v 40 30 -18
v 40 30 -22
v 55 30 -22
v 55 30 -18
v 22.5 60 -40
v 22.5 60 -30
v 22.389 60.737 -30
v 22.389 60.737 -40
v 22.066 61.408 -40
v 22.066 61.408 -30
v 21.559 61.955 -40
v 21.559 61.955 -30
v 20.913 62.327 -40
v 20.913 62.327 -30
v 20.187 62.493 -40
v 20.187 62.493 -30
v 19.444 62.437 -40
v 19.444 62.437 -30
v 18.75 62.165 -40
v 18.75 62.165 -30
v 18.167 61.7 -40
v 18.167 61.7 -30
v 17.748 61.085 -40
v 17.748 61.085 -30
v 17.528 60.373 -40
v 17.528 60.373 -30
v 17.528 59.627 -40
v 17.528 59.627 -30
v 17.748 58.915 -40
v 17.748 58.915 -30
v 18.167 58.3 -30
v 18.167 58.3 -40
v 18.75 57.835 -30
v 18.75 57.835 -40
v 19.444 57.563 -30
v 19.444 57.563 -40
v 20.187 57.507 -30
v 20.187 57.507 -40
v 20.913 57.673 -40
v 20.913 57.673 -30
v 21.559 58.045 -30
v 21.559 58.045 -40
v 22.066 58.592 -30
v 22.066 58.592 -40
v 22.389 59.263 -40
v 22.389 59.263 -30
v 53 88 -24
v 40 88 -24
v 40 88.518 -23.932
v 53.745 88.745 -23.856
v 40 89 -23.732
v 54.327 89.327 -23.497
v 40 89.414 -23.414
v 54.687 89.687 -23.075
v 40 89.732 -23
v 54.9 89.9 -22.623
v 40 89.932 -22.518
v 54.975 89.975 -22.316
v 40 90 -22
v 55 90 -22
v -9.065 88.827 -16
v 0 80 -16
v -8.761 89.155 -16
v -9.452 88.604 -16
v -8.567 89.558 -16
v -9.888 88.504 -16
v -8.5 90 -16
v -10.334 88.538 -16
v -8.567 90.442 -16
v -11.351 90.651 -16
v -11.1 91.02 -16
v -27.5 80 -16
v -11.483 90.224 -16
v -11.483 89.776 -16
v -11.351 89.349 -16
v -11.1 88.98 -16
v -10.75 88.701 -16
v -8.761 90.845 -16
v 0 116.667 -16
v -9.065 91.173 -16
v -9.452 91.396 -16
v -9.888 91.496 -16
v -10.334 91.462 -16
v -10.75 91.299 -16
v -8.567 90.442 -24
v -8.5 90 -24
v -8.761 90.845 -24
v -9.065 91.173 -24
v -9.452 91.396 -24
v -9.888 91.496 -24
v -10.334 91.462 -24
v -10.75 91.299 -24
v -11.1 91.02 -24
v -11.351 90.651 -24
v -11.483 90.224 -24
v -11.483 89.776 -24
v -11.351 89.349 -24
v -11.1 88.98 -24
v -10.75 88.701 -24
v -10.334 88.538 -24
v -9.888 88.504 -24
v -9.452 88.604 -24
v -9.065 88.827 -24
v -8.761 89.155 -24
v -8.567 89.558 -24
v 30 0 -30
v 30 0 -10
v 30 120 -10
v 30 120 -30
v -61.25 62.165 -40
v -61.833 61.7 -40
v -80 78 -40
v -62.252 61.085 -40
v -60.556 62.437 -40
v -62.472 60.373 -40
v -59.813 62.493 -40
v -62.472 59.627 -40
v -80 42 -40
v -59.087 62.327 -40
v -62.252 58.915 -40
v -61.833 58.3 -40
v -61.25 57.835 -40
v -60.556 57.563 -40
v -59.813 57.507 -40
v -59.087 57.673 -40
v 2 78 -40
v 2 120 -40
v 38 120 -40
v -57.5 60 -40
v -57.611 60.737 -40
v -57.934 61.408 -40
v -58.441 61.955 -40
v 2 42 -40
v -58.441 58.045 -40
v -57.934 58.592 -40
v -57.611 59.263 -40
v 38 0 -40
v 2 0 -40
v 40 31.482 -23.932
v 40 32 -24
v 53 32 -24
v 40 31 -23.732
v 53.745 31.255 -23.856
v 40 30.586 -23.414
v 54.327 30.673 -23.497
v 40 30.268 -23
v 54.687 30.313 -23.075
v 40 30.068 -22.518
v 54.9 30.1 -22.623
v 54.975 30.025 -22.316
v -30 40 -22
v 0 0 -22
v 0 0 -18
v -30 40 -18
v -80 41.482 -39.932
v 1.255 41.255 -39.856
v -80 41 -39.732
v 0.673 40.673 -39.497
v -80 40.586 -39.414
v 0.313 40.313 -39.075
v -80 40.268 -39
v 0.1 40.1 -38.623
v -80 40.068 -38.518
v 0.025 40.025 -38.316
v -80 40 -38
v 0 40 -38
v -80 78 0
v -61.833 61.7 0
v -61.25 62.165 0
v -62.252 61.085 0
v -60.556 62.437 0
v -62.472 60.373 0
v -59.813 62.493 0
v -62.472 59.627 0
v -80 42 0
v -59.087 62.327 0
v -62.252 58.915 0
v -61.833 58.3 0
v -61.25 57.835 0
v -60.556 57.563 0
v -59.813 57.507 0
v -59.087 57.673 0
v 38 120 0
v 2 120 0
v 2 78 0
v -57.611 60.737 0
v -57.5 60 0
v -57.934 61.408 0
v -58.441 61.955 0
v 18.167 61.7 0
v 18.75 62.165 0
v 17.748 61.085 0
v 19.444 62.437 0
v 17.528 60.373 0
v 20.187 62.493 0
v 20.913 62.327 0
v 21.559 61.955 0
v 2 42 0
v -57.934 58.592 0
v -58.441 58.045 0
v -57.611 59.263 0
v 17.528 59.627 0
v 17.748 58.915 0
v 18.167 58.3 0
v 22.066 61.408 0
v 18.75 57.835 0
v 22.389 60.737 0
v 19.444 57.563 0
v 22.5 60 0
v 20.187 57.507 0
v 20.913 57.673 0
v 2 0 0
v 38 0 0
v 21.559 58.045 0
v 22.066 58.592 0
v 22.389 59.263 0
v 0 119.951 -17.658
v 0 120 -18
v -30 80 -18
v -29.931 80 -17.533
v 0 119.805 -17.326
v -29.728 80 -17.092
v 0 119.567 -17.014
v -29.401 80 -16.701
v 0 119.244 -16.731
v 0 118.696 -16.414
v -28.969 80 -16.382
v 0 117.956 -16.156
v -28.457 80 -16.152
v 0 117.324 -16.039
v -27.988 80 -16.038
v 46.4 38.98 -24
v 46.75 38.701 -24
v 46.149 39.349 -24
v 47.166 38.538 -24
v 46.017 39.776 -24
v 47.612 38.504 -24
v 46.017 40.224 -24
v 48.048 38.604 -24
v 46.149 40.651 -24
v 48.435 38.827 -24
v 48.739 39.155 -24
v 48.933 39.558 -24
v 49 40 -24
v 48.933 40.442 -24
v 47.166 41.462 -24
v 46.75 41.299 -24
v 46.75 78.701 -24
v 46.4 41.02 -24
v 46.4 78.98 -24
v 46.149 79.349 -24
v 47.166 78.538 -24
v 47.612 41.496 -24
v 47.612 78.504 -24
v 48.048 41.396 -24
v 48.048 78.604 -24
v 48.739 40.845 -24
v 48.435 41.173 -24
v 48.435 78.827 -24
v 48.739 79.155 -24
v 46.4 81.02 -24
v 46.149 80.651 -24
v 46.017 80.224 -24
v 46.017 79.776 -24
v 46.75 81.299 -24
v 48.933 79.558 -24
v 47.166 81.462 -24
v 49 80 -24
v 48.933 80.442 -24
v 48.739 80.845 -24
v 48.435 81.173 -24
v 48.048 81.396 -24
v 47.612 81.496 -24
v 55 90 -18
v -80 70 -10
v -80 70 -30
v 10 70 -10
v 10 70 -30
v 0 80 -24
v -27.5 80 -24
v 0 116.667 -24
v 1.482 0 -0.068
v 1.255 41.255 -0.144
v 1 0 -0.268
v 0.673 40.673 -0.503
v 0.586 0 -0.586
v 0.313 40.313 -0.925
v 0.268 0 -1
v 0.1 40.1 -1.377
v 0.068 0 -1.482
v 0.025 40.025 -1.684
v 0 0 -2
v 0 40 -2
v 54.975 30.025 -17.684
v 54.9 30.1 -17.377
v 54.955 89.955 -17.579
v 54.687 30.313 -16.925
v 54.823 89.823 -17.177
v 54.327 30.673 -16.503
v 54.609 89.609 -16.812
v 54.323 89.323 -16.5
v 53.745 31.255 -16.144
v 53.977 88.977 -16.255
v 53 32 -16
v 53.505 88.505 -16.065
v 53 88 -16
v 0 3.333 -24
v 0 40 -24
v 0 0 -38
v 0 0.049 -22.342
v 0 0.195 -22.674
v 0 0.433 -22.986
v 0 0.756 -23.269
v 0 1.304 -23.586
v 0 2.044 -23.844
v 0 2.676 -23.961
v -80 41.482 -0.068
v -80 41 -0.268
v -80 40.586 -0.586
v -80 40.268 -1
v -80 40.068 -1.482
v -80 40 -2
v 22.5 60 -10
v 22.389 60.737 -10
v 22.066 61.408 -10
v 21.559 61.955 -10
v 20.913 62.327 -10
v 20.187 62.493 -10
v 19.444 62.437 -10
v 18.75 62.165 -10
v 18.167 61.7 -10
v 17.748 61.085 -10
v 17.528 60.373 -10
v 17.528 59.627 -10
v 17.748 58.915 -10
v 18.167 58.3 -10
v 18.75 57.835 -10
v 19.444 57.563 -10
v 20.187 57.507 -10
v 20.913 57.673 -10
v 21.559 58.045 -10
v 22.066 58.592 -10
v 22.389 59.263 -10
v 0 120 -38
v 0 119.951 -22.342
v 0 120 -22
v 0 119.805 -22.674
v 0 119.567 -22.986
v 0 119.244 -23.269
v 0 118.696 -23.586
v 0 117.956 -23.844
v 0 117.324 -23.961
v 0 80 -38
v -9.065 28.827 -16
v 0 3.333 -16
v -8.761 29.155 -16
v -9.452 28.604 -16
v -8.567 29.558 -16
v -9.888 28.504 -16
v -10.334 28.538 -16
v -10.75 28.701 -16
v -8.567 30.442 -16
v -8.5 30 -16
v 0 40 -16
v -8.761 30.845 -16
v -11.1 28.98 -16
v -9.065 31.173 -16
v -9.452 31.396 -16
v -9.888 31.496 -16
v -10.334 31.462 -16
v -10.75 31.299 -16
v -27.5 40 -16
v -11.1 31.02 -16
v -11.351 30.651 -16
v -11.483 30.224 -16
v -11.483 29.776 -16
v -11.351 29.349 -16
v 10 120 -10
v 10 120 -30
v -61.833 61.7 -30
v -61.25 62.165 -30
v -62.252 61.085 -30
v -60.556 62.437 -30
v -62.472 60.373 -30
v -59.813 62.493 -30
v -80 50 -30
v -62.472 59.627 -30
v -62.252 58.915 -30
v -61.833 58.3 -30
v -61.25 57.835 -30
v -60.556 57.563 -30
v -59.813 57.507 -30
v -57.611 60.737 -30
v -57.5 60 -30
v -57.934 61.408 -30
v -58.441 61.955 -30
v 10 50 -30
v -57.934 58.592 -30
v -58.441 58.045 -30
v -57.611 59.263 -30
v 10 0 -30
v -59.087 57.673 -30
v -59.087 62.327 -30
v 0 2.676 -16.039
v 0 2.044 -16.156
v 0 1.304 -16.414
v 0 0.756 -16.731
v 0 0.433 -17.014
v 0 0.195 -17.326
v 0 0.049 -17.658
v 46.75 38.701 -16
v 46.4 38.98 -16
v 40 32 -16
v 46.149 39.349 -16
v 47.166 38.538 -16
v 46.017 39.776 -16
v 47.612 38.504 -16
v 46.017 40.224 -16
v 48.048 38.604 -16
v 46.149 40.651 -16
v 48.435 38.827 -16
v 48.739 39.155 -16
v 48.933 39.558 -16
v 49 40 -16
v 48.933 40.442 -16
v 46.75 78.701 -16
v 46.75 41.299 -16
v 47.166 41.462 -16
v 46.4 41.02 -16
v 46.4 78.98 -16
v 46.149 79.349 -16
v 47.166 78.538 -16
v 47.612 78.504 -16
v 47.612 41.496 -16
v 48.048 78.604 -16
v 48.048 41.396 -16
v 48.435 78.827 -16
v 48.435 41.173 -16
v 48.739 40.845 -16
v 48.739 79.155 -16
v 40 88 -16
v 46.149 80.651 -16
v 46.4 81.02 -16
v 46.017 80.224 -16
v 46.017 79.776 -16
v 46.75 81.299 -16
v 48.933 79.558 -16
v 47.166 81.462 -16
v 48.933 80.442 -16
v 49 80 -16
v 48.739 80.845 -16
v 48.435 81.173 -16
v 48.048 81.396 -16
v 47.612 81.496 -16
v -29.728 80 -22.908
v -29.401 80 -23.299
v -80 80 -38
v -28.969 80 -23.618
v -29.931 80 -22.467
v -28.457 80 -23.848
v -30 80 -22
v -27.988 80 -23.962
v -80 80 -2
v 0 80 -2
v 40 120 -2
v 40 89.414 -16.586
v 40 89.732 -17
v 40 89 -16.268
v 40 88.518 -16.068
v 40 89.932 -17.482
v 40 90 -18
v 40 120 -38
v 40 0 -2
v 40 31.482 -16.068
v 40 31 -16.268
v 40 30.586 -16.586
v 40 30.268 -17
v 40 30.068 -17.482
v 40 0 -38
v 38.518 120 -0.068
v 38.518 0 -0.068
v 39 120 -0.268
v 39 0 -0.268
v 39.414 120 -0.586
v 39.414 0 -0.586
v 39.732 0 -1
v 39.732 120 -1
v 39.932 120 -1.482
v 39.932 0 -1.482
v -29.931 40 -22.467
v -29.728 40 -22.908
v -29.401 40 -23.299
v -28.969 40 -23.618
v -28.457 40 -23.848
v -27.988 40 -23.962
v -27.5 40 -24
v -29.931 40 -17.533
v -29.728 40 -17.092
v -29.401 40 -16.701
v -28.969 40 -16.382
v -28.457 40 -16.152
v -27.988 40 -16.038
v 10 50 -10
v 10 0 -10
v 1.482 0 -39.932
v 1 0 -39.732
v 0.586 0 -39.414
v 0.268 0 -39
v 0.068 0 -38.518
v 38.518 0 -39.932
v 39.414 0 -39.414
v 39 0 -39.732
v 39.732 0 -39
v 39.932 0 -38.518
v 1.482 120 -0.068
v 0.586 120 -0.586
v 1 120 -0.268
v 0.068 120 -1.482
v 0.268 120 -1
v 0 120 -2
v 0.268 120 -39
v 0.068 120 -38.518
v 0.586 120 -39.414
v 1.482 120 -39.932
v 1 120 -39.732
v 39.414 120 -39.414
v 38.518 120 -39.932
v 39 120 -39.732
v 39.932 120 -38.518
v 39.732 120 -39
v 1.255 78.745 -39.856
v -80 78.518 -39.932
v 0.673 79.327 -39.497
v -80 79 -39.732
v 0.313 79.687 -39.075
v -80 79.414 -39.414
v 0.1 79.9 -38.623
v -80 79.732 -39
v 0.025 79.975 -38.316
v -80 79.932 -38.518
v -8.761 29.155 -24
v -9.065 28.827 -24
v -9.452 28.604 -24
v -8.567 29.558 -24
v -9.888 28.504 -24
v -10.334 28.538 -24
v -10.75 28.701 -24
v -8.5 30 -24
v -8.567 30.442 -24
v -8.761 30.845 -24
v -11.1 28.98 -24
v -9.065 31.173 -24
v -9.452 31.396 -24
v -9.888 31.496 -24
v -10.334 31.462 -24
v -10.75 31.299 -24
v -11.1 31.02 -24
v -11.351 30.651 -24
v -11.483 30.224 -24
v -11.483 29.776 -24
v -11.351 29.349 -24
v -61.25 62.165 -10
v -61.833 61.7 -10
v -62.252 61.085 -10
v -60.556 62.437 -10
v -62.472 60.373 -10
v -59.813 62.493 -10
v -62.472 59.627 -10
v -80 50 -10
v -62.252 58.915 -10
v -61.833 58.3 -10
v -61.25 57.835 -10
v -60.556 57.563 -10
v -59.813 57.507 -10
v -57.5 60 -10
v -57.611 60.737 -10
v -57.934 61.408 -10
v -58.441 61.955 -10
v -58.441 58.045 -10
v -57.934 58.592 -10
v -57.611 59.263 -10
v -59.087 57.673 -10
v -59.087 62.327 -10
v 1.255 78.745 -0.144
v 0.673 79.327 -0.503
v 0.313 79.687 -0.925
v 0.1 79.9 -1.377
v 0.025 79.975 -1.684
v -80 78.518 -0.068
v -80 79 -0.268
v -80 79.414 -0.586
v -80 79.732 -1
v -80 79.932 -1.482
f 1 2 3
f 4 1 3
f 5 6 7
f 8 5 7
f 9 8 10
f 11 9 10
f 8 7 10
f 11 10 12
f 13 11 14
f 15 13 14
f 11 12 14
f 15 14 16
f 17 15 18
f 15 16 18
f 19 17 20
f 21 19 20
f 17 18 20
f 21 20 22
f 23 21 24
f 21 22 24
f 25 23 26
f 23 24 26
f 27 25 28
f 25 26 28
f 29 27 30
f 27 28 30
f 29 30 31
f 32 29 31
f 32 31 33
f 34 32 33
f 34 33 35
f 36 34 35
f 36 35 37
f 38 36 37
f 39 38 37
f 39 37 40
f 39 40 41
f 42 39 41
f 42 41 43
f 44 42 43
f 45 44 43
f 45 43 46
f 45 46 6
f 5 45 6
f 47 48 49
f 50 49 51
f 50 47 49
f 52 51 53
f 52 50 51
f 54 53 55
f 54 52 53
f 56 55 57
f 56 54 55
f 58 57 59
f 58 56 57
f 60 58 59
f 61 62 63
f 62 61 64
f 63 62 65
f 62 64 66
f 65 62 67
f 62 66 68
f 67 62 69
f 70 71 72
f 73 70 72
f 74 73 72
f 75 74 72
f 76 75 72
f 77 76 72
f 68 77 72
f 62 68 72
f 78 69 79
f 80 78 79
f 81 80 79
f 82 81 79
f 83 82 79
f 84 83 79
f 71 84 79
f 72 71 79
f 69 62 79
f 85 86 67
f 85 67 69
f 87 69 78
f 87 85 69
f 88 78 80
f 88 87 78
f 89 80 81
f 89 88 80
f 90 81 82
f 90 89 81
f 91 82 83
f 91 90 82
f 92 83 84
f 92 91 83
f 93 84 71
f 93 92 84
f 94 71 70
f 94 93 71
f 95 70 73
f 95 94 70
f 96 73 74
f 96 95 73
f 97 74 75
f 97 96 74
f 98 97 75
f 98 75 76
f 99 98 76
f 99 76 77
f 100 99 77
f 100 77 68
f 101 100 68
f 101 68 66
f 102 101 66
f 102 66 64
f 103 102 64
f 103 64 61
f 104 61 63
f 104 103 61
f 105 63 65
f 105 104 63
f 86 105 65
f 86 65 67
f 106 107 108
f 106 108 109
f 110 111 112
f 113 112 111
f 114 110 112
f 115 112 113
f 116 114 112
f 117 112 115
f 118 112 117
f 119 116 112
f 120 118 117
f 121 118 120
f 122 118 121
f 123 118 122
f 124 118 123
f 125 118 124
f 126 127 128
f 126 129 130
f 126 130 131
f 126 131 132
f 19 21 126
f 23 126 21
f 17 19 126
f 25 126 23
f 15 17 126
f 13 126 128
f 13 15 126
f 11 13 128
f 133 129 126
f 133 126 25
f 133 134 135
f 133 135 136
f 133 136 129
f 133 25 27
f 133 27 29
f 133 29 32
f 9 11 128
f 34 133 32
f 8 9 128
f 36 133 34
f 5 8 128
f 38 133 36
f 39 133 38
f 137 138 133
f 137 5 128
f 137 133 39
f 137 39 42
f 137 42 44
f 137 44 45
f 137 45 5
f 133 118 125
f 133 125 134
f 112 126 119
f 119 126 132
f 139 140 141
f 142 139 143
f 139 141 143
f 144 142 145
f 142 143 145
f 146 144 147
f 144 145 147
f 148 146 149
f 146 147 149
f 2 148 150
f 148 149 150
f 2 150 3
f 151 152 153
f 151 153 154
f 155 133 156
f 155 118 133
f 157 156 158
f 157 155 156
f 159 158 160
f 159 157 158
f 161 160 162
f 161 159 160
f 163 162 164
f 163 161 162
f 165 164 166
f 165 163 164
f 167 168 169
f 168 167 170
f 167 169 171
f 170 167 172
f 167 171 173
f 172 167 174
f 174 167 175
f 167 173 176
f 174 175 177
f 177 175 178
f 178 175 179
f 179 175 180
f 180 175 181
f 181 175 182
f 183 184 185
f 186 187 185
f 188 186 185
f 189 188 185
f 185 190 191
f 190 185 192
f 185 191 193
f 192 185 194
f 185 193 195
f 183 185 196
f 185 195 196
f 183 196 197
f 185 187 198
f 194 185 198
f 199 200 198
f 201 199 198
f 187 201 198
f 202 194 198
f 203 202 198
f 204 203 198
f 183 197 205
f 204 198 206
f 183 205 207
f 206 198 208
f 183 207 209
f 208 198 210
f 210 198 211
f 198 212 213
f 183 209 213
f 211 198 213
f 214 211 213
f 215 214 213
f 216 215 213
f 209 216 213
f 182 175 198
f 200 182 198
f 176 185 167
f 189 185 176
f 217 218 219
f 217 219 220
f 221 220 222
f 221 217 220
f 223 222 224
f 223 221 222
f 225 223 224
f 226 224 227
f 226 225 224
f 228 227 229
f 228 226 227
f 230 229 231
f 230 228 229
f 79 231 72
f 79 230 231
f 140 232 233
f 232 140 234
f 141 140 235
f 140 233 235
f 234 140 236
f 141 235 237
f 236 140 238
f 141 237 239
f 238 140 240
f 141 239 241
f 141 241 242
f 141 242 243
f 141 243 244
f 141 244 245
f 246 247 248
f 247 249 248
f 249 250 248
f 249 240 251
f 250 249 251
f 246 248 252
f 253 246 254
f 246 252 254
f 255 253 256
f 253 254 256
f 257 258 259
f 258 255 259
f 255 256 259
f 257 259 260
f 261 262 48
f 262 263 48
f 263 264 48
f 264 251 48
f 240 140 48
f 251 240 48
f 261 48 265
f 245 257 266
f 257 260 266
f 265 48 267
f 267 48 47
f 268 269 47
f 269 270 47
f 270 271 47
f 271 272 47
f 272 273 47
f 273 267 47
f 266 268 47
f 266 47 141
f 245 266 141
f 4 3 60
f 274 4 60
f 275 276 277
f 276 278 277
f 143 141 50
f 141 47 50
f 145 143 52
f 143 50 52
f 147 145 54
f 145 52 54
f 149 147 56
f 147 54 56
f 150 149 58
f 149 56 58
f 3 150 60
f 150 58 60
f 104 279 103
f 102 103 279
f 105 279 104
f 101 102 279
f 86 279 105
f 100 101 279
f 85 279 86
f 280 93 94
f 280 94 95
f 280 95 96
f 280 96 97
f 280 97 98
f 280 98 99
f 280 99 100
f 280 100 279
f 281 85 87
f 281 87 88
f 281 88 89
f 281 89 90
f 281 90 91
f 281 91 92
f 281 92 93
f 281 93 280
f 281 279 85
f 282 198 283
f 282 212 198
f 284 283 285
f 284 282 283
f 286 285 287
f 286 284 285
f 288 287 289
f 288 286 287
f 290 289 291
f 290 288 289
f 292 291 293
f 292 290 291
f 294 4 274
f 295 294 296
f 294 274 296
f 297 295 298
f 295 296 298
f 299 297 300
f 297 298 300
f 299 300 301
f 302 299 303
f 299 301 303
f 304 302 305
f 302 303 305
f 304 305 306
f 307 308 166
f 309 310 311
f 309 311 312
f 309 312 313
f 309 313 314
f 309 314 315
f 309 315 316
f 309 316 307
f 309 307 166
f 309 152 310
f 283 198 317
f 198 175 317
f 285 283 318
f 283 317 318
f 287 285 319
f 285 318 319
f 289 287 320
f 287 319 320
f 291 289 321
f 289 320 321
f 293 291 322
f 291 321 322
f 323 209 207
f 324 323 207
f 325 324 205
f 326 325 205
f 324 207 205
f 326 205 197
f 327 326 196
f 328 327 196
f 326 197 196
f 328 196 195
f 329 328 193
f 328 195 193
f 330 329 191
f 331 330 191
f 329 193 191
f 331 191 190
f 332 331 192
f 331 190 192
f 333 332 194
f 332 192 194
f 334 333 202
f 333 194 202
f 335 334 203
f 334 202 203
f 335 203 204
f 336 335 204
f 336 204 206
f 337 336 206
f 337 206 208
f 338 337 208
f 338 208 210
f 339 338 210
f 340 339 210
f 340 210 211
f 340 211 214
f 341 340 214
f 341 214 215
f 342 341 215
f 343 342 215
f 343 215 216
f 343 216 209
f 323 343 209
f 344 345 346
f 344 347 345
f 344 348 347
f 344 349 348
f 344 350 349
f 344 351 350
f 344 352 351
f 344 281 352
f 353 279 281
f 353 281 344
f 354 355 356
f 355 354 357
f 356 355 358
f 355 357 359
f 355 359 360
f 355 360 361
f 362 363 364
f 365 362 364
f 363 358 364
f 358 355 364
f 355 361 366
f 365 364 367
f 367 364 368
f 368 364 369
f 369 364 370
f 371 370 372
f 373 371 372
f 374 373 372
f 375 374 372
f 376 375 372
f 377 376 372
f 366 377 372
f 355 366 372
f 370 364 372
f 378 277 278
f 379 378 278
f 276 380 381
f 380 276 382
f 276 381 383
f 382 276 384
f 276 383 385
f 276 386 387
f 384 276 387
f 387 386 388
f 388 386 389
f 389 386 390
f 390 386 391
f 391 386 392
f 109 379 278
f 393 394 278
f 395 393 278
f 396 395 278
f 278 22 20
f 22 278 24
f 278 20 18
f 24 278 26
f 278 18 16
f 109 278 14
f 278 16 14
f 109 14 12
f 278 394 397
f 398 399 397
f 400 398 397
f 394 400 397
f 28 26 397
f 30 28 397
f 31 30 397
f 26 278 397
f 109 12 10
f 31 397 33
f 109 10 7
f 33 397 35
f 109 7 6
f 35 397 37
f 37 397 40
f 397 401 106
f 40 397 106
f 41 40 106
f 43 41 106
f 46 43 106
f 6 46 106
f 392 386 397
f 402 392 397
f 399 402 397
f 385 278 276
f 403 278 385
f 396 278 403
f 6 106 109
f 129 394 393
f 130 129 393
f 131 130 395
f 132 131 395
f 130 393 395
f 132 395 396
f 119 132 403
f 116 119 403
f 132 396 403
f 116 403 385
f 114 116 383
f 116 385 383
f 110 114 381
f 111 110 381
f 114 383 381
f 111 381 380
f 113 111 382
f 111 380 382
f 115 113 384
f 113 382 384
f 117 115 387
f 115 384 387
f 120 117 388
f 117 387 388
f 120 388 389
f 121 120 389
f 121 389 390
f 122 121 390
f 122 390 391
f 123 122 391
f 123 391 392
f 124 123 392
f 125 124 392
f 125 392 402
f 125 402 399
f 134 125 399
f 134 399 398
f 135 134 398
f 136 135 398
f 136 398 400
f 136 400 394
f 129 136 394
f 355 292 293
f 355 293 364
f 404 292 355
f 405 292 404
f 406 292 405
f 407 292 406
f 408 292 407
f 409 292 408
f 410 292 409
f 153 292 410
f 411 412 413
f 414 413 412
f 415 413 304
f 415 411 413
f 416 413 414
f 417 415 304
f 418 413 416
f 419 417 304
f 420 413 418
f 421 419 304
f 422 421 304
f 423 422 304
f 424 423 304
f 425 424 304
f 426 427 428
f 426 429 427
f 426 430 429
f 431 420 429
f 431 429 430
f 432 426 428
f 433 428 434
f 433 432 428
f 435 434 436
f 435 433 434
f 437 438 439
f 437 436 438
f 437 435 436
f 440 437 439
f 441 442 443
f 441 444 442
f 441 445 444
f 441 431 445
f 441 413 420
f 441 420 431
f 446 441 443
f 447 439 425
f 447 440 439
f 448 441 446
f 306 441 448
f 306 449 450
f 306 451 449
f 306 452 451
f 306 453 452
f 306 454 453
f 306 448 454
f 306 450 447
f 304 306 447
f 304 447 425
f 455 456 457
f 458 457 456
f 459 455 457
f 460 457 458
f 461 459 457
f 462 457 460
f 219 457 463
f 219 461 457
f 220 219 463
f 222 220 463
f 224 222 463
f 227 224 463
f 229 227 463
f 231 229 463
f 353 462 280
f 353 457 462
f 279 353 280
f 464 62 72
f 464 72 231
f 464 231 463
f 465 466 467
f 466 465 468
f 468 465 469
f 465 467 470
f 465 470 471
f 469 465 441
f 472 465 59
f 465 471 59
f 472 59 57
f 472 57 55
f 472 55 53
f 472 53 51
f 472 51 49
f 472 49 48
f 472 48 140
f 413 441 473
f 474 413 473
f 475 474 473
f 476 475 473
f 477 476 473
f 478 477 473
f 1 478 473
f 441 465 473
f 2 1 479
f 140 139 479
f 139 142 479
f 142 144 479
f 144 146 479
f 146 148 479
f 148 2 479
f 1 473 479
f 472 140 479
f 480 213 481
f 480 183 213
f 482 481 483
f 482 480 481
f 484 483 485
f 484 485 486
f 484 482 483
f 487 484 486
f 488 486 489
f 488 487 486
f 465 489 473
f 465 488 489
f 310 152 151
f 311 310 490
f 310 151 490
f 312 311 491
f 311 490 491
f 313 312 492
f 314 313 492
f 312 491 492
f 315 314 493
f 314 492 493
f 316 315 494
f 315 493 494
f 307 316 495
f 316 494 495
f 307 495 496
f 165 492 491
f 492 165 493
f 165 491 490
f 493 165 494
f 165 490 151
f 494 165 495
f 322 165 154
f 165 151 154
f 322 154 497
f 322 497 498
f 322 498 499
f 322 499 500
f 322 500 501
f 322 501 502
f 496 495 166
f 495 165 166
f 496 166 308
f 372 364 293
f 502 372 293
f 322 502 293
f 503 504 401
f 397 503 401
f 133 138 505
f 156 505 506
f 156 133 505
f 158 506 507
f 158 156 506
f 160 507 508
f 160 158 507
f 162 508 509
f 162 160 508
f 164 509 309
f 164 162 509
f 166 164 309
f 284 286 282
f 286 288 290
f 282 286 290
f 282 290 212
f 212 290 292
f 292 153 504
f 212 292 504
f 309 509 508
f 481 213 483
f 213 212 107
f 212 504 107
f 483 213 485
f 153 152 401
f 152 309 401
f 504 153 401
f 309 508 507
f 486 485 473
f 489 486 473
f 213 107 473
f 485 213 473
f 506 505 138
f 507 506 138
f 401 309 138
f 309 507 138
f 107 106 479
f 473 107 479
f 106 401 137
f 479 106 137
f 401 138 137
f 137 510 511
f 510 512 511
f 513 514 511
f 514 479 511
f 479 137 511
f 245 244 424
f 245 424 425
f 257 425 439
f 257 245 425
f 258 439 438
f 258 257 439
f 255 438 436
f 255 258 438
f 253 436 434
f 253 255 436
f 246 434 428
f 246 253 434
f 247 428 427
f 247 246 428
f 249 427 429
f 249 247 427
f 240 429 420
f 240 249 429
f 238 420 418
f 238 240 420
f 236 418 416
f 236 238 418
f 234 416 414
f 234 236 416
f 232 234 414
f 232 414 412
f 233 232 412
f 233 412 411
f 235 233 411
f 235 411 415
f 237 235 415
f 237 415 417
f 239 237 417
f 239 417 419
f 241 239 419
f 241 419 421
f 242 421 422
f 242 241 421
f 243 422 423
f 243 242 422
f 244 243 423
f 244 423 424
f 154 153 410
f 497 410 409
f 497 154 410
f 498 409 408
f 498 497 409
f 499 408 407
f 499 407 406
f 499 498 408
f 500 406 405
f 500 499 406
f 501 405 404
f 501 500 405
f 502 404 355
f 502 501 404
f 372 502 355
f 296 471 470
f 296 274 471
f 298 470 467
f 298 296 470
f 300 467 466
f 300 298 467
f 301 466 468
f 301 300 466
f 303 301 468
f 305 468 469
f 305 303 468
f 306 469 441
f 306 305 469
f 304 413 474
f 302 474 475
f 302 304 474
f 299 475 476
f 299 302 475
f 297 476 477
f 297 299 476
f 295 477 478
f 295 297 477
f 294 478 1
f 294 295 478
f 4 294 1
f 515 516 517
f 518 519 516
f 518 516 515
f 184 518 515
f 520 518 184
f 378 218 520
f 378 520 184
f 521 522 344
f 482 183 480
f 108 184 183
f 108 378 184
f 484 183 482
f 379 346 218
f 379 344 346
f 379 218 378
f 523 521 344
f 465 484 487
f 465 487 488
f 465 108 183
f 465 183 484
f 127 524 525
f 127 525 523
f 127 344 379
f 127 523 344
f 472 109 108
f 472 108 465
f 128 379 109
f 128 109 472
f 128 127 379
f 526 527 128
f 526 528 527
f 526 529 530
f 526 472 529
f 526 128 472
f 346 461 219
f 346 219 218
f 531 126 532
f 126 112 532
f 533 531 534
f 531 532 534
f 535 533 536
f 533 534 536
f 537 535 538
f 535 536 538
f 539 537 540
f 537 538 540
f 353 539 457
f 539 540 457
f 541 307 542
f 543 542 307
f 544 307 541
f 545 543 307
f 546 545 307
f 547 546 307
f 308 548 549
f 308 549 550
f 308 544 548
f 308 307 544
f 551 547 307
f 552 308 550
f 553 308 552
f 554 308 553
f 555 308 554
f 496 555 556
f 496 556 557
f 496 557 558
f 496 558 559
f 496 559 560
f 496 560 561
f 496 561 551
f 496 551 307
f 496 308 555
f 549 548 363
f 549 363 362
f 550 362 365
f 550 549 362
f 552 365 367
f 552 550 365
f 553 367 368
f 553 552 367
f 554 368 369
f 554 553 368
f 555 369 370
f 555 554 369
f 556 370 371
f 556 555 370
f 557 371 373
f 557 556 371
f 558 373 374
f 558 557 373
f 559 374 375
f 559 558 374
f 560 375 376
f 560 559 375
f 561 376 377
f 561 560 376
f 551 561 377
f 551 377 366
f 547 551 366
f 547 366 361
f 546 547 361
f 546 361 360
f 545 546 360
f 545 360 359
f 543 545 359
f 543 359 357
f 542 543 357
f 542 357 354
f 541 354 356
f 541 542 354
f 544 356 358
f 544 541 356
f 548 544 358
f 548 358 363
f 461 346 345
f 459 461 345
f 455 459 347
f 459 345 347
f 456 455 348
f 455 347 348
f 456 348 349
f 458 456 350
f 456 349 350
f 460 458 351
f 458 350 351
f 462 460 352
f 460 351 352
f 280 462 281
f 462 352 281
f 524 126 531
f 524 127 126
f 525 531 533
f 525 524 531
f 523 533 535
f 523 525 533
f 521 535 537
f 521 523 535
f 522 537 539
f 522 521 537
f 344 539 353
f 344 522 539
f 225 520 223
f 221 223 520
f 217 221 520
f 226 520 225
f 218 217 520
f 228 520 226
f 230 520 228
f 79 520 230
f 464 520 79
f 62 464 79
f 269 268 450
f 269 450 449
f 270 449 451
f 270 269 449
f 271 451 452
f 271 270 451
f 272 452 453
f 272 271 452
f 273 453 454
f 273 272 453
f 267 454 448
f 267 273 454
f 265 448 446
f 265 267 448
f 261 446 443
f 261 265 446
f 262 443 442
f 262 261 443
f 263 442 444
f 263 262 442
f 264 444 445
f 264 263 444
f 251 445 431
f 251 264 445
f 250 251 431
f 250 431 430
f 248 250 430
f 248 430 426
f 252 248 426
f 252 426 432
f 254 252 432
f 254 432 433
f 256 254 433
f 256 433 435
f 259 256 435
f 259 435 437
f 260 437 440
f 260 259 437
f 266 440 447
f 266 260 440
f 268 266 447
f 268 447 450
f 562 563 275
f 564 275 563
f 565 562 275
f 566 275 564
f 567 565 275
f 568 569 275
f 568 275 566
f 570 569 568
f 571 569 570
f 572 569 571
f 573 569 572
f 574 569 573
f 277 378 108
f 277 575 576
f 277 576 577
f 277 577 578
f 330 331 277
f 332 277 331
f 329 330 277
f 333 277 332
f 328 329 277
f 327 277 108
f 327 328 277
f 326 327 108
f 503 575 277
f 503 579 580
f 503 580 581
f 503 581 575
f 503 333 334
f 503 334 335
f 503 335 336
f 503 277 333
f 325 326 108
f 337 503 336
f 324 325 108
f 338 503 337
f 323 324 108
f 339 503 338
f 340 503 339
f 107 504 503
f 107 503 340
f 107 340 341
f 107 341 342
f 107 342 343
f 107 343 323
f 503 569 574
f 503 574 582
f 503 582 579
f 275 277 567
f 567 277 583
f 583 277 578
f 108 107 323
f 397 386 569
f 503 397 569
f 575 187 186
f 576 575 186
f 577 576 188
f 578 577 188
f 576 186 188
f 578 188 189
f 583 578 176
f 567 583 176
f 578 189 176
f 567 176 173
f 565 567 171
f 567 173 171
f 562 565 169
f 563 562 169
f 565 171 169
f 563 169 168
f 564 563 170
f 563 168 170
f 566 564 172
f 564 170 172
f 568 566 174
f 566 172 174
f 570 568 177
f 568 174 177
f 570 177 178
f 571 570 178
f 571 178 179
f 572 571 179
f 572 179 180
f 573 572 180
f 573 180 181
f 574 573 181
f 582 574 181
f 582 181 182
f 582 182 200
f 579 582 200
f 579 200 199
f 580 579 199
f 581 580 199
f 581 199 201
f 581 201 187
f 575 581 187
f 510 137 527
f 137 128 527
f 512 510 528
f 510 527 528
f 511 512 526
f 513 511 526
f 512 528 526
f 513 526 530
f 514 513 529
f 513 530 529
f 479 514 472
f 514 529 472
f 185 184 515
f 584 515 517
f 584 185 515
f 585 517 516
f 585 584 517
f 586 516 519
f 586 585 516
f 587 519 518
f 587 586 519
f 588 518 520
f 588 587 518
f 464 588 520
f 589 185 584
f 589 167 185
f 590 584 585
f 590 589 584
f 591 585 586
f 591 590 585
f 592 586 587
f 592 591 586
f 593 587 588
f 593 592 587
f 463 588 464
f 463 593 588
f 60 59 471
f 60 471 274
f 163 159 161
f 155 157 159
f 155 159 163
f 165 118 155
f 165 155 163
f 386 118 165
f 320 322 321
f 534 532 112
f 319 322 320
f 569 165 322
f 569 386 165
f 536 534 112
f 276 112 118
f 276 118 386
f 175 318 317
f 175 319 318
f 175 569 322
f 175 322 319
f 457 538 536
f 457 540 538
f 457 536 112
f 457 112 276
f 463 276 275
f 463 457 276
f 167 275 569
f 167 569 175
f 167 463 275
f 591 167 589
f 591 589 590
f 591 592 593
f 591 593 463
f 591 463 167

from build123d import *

# Parameters (mm, degrees)
SKETCH1_W                = 40
SKETCH1_H                = 40
SKETCH1_W_2              = 20
SKETCH1_H_2              = 20
BOSS_EXTRUDE1_DEPTH      = 120
SKETCH2_W                = 40
SKETCH2_H                = 40
SKETCH2_W_2              = 20
SKETCH2_H_2              = 20
BOSS_EXTRUDE2_DEPTH      = 80
BOSS_EXTRUDE3_DEPTH      = 4
BOSS_EXTRUDE3_DEPTH_BACK = 4
SKETCH5_R                = 1.5
SKETCH5_W                = 15
SKETCH5_H                = 60
SKETCH7_W                = 20
SKETCH7_H                = 20
CUT_EXTRUDE2_DEPTH       = 30
SKETCH8_R                = 2.5
CUT_EXTRUDE3_DEPTH       = 150.666295471
FILLET1_R                = 2
FILLET2_R                = 2
FILLET3_R                = 2
FILLET4_R                = 2
FILLET5_R                = 2


with BuildPart() as part:
    # Sketch1 → Boss-Extrude1 (new body)
    with BuildSketch(Plane(origin=(0, 0, 0), x_dir=(1, 0, 0), z_dir=(0, 1, 0))):
        with Locations((20, 20)):
            Rectangle(SKETCH1_W, SKETCH1_H)
        with Locations((20, 20)):
            Rectangle(SKETCH1_W_2, SKETCH1_H_2, mode=Mode.SUBTRACT)
    extrude(amount=BOSS_EXTRUDE1_DEPTH)

    # Sketch2 → Boss-Extrude2 (add)
    with BuildSketch(Plane.ZY):
        with Locations((-20, 60)):
            Rectangle(SKETCH2_W, SKETCH2_H)
        with Locations((-20, 60)):
            Rectangle(SKETCH2_W_2, SKETCH2_H_2, mode=Mode.SUBTRACT)
    extrude(amount=BOSS_EXTRUDE2_DEPTH)

    # Sketch5 → Boss-Extrude3 (add, two sides: drawn at the far end of the back side and taken through both)
    # profile 1 of 3: a face of its own
    with BuildSketch(Plane.XY.offset(-20).offset(-BOSS_EXTRUDE3_DEPTH_BACK)):
        Polygon((0, 120), (0, 80), (-30, 80), align=None)
        with Locations((-10, 90)):
            Circle(SKETCH5_R, mode=Mode.SUBTRACT)
    # profile 2 of 3: a face of its own
    with BuildSketch(Plane.XY.offset(-20).offset(-BOSS_EXTRUDE3_DEPTH_BACK)):
        Polygon((0, 0), (-30, 40), (0, 40), align=None)
        with Locations((-10, 30)):
            Circle(SKETCH5_R, mode=Mode.SUBTRACT)
    # profile 3 of 3: a face of its own
    with BuildSketch(Plane.XY.offset(-20).offset(-BOSS_EXTRUDE3_DEPTH_BACK)):
        with Locations((47.5, 60)):
            Rectangle(SKETCH5_W, SKETCH5_H)
        with Locations((47.5, 80)):
            Circle(SKETCH5_R, mode=Mode.SUBTRACT)
        with Locations((47.5, 40)):
            Circle(SKETCH5_R, mode=Mode.SUBTRACT)
    extrude(amount=BOSS_EXTRUDE3_DEPTH + BOSS_EXTRUDE3_DEPTH_BACK)

    # Sketch7 → Cut-Extrude2 (cut)
    with BuildSketch(Plane.ZY):
        with Locations((-20, 60)):
            Rectangle(SKETCH7_W, SKETCH7_H)
    extrude(amount=-CUT_EXTRUDE2_DEPTH, mode=Mode.SUBTRACT)

    # Sketch8 → Cut-Extrude3 (cut, through all)
    with BuildSketch(Plane.XY):
        with Locations((-60, 60)):
            Circle(SKETCH8_R)
        with Locations((20, 60)):
            Circle(SKETCH8_R)
    extrude(amount=-CUT_EXTRUDE3_DEPTH, mode=Mode.SUBTRACT)

    # Fillet1
    fillet1_edges = [part.edges().sort_by_distance(p)[0] for p in [
        (-40, 80, 0),
    ]]
    fillet(fillet1_edges, radius=FILLET1_R)

    # Fillet2
    fillet2_edges = [part.edges().sort_by_distance(p)[0] for p in [
        (-40, 80, -40),
        (-40, 40, -40),
        (-40, 40, 0),
    ]]
    fillet(fillet2_edges, radius=FILLET2_R)

    # Fillet3
    fillet3_edges = [part.edges().sort_by_distance(p)[0] for p in [
        (40, 60, -40),
        (40, 60, 0),
        (0, 21, -40),
        (0, 21, 0),
        (0, 99, -40),
        (0, 99, 0),
    ]]
    fillet(fillet3_edges, radius=FILLET3_R)

    # Fillet4
    fillet4_edges = [part.edges().sort_by_distance(p)[0] for p in [
        (47.5, 90, -24),
        (55, 60, -24),
        (47.5, 30, -24),
        (47.5, 30, -16),
        (55, 60, -16),
        (47.5, 90, -16),
    ]]
    fillet(fillet4_edges, radius=FILLET4_R)

    # Fillet5
    fillet5_edges = [part.edges().sort_by_distance(p)[0] for p in [
        (-15, 20, -24),
        (-15, 20, -16),
        (-15, 100, -24),
        (-15, 100, -16),
    ]]
    fillet(fillet5_edges, radius=FILLET5_R)


solid = part.part
